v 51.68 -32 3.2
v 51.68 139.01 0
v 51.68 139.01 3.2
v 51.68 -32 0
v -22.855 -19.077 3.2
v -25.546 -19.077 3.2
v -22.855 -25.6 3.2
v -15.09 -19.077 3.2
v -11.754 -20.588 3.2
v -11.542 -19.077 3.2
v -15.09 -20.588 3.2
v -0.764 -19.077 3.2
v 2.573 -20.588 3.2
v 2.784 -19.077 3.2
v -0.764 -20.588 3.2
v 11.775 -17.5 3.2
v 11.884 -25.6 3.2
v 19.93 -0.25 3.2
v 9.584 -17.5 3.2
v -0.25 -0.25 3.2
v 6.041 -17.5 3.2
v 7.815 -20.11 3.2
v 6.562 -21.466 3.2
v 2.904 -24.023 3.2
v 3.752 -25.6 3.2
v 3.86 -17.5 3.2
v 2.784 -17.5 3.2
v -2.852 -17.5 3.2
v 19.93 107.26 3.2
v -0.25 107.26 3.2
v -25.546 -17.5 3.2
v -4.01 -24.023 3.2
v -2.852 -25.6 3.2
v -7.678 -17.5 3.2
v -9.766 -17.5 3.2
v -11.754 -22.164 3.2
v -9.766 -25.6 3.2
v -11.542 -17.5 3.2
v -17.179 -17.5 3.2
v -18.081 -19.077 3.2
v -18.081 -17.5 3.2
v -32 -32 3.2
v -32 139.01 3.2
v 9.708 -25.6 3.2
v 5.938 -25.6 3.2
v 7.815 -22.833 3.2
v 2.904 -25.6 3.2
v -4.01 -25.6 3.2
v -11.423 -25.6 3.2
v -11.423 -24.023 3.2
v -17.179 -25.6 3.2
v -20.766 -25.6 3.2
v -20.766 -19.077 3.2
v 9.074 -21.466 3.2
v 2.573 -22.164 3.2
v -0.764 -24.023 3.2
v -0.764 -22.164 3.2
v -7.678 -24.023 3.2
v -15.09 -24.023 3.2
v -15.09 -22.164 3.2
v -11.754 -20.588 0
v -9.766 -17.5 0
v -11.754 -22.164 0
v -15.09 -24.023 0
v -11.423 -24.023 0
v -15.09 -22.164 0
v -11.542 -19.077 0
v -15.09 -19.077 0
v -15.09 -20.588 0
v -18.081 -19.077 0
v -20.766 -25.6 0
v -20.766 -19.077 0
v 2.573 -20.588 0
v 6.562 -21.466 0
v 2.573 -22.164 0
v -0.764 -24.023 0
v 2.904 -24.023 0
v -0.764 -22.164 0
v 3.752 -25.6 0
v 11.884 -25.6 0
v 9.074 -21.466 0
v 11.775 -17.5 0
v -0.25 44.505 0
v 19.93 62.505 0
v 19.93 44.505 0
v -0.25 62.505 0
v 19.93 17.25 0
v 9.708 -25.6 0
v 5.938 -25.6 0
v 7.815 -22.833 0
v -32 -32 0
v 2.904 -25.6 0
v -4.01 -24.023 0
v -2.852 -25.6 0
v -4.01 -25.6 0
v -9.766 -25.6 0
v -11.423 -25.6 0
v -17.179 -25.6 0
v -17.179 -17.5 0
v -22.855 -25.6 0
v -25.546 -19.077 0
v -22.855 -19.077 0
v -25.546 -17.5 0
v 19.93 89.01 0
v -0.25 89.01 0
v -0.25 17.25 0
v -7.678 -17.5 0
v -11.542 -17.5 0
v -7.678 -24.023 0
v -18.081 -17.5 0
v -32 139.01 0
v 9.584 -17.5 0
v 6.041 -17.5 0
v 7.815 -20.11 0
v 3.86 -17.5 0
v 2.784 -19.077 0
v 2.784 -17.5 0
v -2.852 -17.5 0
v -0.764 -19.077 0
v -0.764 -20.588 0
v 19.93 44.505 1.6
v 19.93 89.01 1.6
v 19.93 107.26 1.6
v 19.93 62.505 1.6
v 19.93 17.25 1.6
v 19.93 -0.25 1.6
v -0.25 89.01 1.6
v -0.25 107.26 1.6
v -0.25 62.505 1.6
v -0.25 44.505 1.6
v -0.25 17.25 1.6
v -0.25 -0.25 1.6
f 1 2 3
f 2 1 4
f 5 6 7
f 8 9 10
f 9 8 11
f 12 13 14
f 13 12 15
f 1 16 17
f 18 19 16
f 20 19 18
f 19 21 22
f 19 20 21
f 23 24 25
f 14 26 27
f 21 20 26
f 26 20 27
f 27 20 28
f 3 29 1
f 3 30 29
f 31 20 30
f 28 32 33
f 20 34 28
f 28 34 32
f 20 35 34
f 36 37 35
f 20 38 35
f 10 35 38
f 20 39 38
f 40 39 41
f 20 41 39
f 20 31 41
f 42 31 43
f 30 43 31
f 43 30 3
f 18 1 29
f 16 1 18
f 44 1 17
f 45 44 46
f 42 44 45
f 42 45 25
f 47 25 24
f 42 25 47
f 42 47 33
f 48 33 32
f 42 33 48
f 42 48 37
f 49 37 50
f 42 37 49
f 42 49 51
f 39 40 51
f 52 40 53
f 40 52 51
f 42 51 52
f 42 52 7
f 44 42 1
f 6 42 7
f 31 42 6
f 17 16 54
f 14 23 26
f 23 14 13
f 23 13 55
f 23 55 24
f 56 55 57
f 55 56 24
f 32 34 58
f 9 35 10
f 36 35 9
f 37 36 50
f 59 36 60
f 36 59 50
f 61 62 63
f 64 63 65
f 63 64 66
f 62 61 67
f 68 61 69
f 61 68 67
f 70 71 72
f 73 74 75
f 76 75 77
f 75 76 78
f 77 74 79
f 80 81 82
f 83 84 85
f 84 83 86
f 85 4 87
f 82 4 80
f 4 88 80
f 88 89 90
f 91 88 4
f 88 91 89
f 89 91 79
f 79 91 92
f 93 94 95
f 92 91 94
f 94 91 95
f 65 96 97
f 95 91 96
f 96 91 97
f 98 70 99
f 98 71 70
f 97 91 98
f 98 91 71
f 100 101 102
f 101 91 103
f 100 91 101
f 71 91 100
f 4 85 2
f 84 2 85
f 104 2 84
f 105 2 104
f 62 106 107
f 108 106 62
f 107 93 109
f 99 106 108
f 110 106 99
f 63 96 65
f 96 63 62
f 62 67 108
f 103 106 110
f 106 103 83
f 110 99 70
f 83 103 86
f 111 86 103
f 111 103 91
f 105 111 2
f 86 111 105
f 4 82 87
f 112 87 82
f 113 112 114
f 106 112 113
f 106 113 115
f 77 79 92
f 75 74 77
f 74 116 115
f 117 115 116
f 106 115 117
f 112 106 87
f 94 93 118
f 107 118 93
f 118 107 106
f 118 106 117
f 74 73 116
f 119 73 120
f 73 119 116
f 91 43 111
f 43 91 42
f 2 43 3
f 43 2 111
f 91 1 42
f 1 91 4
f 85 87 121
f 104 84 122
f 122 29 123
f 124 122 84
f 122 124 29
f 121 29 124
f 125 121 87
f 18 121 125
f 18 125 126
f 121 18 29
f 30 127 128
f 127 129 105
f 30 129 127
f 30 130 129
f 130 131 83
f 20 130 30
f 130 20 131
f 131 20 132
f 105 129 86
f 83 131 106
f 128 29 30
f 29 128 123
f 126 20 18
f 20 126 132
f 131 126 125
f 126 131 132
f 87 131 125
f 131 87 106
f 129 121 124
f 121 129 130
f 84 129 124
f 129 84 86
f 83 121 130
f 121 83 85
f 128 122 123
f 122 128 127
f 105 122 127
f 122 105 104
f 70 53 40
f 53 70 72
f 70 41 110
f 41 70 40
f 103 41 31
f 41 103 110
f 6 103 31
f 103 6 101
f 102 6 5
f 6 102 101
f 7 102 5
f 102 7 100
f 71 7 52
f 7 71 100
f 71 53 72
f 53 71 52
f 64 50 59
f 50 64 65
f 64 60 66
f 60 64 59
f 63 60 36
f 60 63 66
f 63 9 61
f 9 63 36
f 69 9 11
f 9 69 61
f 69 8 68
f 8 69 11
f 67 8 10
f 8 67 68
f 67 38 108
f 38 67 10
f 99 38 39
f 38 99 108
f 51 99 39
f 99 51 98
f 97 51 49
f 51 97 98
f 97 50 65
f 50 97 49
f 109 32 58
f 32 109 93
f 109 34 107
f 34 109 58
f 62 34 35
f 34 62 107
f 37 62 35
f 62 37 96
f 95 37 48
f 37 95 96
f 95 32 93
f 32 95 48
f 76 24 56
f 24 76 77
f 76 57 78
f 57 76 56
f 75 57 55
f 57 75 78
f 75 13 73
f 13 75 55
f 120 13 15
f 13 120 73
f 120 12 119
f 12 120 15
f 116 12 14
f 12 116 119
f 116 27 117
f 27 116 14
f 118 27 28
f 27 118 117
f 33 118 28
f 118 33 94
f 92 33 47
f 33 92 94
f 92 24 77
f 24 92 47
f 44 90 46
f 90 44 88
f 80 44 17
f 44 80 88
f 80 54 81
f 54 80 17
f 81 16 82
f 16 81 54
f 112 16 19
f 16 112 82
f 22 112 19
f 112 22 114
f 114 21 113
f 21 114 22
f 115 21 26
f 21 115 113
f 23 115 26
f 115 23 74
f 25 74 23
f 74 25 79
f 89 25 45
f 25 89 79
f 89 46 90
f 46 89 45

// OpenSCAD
$fn = 50;

// TXo Bottom

tolerance = .5;

pcbX = 19.68;
pcbY = 107.01;
pcbZ = 1.6;

frame = 32;

barOneStart = 0;
barOneEnd = 18;

barTwoStart = pcbY / 2 - 9;
barTwoEnd = barTwoStart + 18;

barThreeStart = pcbY - 18;
barThreeEnd = 107.01 + (tolerance / 2);

corner = 2.5;

difference(){

    union(){
        difference() {
            translate([-frame, - frame, 0])
                cube([pcbX + 2 * frame, pcbY + 2 * frame, 2 * pcbZ]);
            translate([-tolerance/2, -tolerance/2, 0])
                cube([pcbX + tolerance, pcbY + tolerance, 2 * pcbZ]);
        }

        translate([-tolerance/2, barOneStart-(tolerance/2), 0])
            cube([pcbX + tolerance, barOneEnd - barOneStart -tolerance, pcbZ]);
            
        translate([-tolerance/2, barTwoStart, 0])
            cube([pcbX + tolerance, barTwoEnd - barTwoStart, pcbZ]);
        
        translate([-tolerance/2, barThreeStart, 0])
            cube([pcbX + tolerance, barThreeEnd - barThreeStart, pcbZ]);

    }

     translate([-frame * .8, -frame * .8]) {
       linear_extrude(height = 2 * pcbZ)
        text("TELEX", font = "Core Humanist Sans:style=Bold", size = 8);
     }
 
 }

/*

translate([-13,-frame * .74,0])
    cube([10, pcbZ * .5, pcbZ / 3]);


translate([-4,-frame * .655,0])
    cube([8, pcbZ * .4, pcbZ / 3]);
 
translate([-4,-frame * .755,0])
    cube([7, pcbZ * .4, pcbZ / 3]);

translate([3,-frame * .74,0])
    cube([7, pcbZ * .4, pcbZ / 3]);
 
translate([18,-frame * .74,0])
    cube([7, pcbZ * .4, pcbZ / 3]);
 
 */               
